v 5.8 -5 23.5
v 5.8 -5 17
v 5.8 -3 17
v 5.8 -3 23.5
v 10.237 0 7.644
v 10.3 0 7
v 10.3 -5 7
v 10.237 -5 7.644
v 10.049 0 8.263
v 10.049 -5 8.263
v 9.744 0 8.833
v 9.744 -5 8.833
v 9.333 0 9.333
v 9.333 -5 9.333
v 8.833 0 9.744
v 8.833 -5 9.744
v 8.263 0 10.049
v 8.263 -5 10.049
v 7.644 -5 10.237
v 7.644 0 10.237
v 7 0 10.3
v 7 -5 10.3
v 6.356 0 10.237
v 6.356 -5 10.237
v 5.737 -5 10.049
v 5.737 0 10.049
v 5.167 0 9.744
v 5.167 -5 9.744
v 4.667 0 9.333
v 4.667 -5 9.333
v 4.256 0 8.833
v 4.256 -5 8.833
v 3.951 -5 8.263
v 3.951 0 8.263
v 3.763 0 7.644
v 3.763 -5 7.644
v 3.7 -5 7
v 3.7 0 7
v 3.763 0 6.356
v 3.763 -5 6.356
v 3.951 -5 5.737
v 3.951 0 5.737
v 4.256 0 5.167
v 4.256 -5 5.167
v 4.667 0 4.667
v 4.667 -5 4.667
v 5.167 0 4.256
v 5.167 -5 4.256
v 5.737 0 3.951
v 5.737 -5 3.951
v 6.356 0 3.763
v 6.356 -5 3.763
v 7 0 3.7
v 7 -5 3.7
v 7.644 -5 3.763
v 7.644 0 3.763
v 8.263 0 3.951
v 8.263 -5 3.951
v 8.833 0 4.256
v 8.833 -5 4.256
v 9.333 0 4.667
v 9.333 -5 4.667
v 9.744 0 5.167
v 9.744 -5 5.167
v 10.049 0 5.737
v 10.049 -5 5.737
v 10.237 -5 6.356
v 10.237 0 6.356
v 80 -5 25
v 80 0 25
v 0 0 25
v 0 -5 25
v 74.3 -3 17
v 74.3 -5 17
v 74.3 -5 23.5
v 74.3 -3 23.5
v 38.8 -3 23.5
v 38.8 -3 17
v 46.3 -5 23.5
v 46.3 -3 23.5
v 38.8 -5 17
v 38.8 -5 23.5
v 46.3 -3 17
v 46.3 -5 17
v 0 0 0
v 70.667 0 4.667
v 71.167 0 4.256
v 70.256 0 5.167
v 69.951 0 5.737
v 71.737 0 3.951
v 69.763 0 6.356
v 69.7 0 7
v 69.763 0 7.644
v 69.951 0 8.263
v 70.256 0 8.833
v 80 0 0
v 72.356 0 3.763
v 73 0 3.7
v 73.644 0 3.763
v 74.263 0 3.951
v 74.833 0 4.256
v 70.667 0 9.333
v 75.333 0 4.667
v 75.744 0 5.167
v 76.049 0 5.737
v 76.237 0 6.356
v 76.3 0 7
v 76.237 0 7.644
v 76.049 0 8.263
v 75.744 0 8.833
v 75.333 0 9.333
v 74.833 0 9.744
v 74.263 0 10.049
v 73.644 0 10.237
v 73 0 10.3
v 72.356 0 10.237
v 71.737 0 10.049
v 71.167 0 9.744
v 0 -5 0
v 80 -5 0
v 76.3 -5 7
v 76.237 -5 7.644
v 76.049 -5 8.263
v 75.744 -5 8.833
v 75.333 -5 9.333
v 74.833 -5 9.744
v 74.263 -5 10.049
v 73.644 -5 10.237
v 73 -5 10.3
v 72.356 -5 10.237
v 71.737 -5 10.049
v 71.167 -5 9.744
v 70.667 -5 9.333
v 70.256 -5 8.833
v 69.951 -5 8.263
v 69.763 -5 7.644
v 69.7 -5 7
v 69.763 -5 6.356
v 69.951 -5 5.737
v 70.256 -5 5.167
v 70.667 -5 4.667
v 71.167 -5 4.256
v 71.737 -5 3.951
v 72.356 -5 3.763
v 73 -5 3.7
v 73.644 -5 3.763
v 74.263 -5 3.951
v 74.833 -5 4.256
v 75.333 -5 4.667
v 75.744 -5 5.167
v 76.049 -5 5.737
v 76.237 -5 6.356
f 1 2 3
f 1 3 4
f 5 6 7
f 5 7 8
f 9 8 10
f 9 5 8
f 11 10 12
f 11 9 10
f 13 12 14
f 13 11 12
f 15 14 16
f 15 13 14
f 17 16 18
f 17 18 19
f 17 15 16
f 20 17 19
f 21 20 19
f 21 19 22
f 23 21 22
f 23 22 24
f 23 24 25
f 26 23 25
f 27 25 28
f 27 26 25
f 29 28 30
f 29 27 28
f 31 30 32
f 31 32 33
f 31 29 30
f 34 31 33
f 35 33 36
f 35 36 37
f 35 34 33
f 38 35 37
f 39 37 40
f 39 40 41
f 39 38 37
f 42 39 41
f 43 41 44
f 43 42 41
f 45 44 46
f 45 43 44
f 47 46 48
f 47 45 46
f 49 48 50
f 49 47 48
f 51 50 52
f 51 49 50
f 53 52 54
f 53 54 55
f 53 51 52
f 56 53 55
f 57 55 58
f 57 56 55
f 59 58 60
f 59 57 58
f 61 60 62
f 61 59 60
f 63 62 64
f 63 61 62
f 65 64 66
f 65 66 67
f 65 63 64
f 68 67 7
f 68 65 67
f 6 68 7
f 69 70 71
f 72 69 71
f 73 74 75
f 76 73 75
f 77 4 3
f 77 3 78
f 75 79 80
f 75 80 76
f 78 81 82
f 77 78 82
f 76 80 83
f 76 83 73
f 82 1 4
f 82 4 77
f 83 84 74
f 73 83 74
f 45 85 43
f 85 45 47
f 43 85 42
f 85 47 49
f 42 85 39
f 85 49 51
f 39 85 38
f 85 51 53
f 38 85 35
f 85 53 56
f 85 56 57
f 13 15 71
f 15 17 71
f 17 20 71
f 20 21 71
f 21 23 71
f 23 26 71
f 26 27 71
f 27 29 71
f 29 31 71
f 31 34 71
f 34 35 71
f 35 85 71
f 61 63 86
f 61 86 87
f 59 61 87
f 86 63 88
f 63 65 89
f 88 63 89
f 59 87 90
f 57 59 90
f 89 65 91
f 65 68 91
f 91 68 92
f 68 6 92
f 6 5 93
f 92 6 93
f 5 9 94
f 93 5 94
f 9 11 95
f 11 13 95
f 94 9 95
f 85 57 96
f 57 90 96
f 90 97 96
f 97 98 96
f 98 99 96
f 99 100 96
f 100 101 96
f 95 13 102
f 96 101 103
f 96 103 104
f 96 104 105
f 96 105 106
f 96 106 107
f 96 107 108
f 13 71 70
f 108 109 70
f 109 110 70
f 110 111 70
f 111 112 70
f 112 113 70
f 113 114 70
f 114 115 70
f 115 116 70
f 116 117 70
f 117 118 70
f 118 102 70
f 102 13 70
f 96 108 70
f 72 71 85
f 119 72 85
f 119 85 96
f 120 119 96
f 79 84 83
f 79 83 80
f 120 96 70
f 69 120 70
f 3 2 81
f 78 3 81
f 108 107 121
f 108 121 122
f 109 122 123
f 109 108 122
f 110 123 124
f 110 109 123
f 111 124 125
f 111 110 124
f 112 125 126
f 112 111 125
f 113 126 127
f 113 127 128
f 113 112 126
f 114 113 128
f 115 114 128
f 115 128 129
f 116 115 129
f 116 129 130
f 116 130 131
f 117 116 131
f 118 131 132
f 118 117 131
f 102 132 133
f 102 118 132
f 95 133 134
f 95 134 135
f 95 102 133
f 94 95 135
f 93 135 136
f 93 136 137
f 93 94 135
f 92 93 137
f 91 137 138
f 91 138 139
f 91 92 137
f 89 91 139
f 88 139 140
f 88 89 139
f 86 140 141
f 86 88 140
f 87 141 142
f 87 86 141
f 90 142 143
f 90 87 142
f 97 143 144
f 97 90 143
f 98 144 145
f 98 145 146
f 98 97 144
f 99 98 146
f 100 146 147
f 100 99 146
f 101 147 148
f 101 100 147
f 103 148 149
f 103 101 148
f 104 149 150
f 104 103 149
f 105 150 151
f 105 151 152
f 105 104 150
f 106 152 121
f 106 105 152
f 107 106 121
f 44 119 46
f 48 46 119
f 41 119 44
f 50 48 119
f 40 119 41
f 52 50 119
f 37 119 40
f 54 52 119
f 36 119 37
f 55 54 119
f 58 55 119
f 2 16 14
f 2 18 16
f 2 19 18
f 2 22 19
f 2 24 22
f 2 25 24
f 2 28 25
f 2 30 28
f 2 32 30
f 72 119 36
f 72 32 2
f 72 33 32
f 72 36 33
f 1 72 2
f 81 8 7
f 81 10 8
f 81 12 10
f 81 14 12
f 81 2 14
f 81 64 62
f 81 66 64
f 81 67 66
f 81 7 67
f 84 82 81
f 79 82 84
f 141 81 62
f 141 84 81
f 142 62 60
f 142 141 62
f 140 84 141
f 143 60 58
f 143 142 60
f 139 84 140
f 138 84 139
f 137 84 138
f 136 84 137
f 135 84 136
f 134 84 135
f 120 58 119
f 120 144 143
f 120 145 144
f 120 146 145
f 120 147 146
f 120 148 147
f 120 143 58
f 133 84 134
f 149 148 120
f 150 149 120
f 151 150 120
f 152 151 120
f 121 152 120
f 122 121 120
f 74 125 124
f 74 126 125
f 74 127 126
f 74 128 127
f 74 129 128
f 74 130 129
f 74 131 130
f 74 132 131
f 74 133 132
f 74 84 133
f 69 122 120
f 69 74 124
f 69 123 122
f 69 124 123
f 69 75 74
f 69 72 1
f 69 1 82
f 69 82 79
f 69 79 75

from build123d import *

# Parameters (mm, degrees)
F0_R     = 3.3
F1_DEPTH = 5
F2_W     = 33
F2_H     = 6.5
F2_W_2   = 28
F3_DEPTH = 2


# Not quite as in the source:
# - a feature names something its author has since deleted; it is built from what else it names


with BuildPart() as f1:
    # F0 (on Front) → F1 (new body)
    with BuildSketch(Plane.XZ):
        Polygon((0, 17), (0, 0), (80, 0), (80, 17), (80, 23), (80, 25), (0, 25), (0, 23), align=None)
        with Locations((7, 7)):
            Circle(F0_R, mode=Mode.SUBTRACT)
        with Locations((73, 7)):
            Circle(F0_R, mode=Mode.SUBTRACT)
    extrude(amount=F1_DEPTH)

    # F2 (on face) → F3 (cut)
    with BuildSketch(Plane.XZ.offset(5)):
        with Locations((22.3, 20.25)):
            Rectangle(F2_W, F2_H)
        with Locations((60.3, 20.25)):
            Rectangle(F2_W_2, F2_H)
    extrude(amount=-F3_DEPTH, mode=Mode.SUBTRACT)


solid = f1.part
